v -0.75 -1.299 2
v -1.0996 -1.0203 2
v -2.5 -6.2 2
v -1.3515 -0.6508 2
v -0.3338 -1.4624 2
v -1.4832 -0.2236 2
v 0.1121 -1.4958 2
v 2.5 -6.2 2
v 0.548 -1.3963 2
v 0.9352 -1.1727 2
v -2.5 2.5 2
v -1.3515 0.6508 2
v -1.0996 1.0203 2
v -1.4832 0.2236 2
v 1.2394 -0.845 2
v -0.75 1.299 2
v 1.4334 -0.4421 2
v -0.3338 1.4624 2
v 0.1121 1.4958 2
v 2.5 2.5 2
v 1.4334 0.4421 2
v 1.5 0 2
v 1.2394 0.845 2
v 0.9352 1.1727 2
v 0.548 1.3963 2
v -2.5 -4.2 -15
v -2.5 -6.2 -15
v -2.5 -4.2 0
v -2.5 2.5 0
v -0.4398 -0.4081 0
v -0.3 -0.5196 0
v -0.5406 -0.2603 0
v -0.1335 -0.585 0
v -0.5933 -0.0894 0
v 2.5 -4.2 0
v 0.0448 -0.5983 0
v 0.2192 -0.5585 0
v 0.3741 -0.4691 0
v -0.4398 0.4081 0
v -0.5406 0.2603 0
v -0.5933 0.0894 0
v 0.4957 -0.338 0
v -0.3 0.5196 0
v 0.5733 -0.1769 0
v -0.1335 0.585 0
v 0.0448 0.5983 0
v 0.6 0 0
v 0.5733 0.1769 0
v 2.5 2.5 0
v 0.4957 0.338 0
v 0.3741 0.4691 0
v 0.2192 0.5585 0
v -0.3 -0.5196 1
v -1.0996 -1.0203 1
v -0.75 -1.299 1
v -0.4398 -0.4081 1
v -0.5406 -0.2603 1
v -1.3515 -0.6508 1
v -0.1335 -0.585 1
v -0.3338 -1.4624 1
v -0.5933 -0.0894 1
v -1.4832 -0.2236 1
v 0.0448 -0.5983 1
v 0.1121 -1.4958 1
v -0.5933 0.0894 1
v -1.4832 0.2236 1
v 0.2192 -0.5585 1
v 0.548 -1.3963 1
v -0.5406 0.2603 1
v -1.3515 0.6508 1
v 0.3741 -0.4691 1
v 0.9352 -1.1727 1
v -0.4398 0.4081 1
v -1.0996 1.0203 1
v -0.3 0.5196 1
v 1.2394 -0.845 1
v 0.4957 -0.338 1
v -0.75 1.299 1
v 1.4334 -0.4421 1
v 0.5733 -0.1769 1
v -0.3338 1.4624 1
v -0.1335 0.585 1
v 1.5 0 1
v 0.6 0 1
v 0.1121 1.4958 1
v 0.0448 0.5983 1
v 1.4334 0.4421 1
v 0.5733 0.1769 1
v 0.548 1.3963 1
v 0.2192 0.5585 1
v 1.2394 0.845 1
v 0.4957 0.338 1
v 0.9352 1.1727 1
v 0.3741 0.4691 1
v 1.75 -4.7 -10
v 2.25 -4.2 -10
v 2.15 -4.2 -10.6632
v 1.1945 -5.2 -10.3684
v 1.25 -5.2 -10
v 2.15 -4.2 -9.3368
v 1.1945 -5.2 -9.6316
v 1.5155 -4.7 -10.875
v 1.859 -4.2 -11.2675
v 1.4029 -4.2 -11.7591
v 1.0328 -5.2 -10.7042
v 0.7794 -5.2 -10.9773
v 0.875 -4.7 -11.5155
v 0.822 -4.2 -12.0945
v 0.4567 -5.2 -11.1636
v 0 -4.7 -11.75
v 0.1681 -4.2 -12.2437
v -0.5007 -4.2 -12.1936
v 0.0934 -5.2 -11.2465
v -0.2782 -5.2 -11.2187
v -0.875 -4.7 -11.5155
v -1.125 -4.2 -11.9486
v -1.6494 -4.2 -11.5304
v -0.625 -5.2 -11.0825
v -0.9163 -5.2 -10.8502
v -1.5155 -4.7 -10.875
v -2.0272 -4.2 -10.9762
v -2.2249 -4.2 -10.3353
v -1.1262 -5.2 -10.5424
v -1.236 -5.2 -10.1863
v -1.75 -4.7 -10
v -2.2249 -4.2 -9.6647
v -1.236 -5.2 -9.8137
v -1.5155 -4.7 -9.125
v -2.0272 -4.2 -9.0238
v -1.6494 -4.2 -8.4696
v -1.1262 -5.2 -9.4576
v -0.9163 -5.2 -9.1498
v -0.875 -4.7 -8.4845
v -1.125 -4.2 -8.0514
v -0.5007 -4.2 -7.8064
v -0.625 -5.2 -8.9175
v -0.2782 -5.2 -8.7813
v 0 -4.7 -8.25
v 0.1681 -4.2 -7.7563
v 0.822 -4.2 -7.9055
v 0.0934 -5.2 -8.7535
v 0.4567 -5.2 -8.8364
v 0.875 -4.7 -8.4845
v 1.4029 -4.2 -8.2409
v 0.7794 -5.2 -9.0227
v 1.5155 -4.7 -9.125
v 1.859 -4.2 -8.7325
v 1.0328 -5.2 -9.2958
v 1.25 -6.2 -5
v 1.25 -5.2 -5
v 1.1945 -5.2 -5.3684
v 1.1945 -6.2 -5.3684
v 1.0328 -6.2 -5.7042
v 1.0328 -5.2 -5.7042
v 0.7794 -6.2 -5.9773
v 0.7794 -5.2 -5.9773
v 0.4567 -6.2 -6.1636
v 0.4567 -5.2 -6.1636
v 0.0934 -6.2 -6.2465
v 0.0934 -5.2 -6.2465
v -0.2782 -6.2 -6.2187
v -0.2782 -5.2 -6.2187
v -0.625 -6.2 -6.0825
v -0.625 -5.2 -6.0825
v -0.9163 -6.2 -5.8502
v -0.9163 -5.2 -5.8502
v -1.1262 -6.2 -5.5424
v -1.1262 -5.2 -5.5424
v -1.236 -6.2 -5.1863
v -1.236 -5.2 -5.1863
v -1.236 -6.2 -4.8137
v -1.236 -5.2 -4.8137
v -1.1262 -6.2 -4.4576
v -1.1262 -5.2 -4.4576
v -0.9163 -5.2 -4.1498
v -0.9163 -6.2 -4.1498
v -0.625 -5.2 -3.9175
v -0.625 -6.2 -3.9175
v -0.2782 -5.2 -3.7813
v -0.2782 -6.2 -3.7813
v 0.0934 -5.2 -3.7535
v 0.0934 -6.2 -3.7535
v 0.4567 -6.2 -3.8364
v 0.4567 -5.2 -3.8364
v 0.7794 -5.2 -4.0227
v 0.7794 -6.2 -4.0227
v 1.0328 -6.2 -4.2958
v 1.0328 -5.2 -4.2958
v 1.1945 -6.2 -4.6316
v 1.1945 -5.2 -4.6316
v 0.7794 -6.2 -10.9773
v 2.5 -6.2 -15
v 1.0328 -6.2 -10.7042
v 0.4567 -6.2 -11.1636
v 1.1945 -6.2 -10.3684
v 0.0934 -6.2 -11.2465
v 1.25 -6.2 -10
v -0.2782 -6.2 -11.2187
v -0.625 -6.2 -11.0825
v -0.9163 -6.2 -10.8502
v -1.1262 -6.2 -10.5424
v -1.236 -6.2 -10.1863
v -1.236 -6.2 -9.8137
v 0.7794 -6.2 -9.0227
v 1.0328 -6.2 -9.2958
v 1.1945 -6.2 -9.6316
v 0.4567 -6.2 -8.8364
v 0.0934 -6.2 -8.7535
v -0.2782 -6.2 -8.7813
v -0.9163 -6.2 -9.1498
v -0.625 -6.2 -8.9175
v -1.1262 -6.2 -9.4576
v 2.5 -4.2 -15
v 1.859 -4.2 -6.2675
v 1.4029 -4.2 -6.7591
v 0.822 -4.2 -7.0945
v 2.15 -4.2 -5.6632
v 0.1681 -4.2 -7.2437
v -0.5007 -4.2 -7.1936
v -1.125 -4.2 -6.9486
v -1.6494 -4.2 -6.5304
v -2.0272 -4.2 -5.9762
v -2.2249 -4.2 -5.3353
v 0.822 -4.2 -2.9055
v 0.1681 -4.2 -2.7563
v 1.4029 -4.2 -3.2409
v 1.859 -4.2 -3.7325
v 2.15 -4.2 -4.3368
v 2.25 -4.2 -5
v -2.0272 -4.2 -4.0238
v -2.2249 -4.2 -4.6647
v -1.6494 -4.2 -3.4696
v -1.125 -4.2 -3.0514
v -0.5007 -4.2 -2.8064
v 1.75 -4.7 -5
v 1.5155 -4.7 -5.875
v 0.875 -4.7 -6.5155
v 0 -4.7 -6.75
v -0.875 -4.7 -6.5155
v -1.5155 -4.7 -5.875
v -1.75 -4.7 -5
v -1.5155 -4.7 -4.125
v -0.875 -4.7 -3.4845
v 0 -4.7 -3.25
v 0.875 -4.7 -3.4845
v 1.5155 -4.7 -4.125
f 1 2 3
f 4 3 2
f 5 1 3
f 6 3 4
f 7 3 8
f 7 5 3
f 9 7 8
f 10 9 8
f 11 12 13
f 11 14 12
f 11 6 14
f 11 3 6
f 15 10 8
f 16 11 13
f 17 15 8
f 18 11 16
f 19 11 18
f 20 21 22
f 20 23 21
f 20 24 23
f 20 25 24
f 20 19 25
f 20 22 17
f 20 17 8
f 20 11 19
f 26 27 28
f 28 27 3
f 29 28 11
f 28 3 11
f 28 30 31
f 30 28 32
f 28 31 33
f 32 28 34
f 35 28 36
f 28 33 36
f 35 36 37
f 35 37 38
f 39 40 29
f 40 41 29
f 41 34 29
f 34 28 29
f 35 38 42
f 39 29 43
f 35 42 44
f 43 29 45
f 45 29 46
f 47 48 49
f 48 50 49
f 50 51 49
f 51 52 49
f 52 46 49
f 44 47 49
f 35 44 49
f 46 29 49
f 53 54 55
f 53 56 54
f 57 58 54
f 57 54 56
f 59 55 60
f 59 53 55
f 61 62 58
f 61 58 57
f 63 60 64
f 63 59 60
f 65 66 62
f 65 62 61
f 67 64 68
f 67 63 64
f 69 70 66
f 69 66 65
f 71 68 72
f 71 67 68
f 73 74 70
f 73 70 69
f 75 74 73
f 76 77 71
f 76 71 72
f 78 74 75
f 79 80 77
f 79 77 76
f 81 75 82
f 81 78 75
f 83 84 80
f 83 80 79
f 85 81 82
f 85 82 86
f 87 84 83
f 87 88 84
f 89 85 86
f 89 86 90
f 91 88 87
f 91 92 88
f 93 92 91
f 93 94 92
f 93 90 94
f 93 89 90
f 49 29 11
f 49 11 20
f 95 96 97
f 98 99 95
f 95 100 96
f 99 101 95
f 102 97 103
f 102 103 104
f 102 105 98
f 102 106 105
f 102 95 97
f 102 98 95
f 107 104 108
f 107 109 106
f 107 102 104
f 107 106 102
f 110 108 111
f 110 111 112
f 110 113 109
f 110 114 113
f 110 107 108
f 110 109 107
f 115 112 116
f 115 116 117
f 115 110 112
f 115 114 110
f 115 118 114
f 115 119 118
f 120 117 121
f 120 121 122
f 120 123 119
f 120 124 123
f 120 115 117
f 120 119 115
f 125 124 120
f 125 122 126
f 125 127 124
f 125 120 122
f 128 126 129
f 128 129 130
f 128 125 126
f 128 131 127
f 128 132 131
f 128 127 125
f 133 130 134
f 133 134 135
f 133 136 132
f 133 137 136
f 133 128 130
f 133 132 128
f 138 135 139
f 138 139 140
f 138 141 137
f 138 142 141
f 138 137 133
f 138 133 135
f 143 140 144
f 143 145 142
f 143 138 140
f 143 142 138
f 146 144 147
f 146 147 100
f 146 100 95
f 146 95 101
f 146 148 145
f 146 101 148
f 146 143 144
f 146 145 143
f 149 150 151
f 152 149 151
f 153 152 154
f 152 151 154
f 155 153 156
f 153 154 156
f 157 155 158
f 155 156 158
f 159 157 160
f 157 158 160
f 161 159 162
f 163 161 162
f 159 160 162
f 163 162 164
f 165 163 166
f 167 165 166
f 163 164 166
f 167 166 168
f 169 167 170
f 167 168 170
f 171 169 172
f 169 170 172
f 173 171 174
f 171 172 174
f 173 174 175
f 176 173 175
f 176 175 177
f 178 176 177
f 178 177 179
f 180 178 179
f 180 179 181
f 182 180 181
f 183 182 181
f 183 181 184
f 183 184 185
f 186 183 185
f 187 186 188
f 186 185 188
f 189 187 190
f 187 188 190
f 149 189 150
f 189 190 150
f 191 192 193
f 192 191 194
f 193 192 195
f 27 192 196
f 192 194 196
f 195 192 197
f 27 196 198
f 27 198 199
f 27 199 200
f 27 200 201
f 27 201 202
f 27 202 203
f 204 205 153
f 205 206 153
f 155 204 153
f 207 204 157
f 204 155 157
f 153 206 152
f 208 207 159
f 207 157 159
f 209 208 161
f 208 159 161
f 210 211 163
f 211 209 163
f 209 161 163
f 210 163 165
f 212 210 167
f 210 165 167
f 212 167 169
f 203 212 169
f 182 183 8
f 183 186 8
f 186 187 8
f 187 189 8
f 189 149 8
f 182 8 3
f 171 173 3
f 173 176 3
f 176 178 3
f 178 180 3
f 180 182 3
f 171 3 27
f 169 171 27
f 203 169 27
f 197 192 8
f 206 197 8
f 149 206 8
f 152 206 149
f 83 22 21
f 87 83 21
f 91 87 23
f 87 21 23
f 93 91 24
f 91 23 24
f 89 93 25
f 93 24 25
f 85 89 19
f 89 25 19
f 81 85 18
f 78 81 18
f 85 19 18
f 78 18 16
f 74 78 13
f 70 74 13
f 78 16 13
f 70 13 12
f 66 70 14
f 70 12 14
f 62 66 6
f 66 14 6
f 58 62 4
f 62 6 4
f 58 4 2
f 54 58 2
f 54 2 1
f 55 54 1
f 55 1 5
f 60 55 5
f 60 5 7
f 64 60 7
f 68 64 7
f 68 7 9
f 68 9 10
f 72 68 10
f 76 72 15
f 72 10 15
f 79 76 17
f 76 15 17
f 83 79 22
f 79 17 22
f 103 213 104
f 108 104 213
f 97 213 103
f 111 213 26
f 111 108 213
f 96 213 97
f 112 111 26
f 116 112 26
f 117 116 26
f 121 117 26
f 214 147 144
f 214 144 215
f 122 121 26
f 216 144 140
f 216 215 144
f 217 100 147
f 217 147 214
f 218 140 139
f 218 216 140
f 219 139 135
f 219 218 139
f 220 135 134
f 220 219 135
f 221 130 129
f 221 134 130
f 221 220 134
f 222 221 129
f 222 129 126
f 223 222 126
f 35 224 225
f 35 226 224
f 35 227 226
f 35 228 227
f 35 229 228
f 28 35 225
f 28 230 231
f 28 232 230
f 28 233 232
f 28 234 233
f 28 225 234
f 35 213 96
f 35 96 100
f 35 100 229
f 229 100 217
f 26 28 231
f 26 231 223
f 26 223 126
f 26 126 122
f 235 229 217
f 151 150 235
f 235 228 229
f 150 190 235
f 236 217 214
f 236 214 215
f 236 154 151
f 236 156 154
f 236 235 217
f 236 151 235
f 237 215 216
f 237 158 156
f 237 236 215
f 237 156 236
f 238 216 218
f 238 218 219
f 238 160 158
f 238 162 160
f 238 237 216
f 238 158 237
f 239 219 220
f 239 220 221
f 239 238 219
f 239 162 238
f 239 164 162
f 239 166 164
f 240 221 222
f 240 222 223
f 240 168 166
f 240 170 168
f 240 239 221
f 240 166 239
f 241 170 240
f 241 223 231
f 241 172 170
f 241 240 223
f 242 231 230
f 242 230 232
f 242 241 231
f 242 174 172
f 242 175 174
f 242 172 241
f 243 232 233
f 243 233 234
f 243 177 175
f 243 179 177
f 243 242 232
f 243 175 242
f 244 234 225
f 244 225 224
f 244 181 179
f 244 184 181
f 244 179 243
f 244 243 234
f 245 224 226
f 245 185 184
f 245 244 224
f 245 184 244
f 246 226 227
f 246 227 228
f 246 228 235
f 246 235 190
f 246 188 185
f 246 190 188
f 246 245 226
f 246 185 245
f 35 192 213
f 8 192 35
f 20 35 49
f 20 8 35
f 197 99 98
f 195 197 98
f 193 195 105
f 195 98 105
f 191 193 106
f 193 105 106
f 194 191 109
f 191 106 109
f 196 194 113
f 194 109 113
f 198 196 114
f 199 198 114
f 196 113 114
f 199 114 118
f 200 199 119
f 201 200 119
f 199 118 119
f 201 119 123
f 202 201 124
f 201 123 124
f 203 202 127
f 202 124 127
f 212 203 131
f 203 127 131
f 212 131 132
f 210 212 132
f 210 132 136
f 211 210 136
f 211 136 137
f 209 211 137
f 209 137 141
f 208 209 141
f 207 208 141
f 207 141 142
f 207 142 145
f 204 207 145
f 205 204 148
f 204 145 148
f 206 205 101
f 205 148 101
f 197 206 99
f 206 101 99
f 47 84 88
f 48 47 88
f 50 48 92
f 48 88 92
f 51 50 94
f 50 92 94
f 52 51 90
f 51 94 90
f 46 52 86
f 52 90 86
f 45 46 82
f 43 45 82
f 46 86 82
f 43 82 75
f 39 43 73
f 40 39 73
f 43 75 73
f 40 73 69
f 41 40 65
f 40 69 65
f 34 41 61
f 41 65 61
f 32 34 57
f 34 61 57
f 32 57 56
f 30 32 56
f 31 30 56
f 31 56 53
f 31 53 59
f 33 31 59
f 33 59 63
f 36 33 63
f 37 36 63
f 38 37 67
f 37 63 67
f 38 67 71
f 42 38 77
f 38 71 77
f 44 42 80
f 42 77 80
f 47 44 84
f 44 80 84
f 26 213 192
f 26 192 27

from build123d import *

# Parameters (mm, degrees)
SKETCH1_W           = 5
SKETCH1_H           = 8.7
BOSS_EXTRUDE2_DEPTH = 2
SKETCH2_R           = 1.5
CUT_EXTRUDE1_DEPTH  = 1
SKETCH3_R           = 0.6
CUT_EXTRUDE2_DEPTH  = 1
SKETCH4_W           = 5
SKETCH4_H           = 2
BOSS_EXTRUDE4_DEPTH = 15
SKETCH6_R           = 1.25
CUT_EXTRUDE4_DEPTH  = 2
CHAMFER1_SIZE       = 1


with BuildPart() as part:
    # Sketch1 → Boss-Extrude2 (new body)
    with BuildSketch(Plane.XY):
        with Locations((0, -1.85)):
            Rectangle(SKETCH1_W, SKETCH1_H)
    extrude(amount=BOSS_EXTRUDE2_DEPTH)

    # Sketch2 → Cut-Extrude1 (cut)
    with BuildSketch(Plane.XY.offset(2)):
        Circle(SKETCH2_R)
    extrude(amount=-CUT_EXTRUDE1_DEPTH, mode=Mode.SUBTRACT)

    # Sketch3 → Cut-Extrude2 (cut)
    with BuildSketch(Plane.XY.offset(1)):
        Circle(SKETCH3_R)
    extrude(amount=-CUT_EXTRUDE2_DEPTH, mode=Mode.SUBTRACT)

    # Sketch4 → Boss-Extrude4 (add)
    with BuildSketch(Plane(origin=(0, 0, 0), x_dir=(-1, 0, 0), z_dir=(0, 0, -1))):
        with Locations((0, -5.2)):
            Rectangle(SKETCH4_W, SKETCH4_H)
    extrude(amount=BOSS_EXTRUDE4_DEPTH)

    # Sketch6 → Cut-Extrude4 (cut)
    with BuildSketch(Plane(origin=(0, -4.2, 0), x_dir=(1, 0, 0), z_dir=(0, 1, 0))):
        with Locations((0, 10)):
            Circle(SKETCH6_R)
        with Locations((0, 5)):
            Circle(SKETCH6_R)
    extrude(amount=-CUT_EXTRUDE4_DEPTH, mode=Mode.SUBTRACT)

    # Chamfer1
    chamfer1_edges = [part.edges().sort_by_distance(p)[0] for p in [
        (-1.25, -4.2, -10),
        (-1.25, -4.2, -5),
    ]]
    chamfer(chamfer1_edges, length=CHAMFER1_SIZE)


solid = part.part
